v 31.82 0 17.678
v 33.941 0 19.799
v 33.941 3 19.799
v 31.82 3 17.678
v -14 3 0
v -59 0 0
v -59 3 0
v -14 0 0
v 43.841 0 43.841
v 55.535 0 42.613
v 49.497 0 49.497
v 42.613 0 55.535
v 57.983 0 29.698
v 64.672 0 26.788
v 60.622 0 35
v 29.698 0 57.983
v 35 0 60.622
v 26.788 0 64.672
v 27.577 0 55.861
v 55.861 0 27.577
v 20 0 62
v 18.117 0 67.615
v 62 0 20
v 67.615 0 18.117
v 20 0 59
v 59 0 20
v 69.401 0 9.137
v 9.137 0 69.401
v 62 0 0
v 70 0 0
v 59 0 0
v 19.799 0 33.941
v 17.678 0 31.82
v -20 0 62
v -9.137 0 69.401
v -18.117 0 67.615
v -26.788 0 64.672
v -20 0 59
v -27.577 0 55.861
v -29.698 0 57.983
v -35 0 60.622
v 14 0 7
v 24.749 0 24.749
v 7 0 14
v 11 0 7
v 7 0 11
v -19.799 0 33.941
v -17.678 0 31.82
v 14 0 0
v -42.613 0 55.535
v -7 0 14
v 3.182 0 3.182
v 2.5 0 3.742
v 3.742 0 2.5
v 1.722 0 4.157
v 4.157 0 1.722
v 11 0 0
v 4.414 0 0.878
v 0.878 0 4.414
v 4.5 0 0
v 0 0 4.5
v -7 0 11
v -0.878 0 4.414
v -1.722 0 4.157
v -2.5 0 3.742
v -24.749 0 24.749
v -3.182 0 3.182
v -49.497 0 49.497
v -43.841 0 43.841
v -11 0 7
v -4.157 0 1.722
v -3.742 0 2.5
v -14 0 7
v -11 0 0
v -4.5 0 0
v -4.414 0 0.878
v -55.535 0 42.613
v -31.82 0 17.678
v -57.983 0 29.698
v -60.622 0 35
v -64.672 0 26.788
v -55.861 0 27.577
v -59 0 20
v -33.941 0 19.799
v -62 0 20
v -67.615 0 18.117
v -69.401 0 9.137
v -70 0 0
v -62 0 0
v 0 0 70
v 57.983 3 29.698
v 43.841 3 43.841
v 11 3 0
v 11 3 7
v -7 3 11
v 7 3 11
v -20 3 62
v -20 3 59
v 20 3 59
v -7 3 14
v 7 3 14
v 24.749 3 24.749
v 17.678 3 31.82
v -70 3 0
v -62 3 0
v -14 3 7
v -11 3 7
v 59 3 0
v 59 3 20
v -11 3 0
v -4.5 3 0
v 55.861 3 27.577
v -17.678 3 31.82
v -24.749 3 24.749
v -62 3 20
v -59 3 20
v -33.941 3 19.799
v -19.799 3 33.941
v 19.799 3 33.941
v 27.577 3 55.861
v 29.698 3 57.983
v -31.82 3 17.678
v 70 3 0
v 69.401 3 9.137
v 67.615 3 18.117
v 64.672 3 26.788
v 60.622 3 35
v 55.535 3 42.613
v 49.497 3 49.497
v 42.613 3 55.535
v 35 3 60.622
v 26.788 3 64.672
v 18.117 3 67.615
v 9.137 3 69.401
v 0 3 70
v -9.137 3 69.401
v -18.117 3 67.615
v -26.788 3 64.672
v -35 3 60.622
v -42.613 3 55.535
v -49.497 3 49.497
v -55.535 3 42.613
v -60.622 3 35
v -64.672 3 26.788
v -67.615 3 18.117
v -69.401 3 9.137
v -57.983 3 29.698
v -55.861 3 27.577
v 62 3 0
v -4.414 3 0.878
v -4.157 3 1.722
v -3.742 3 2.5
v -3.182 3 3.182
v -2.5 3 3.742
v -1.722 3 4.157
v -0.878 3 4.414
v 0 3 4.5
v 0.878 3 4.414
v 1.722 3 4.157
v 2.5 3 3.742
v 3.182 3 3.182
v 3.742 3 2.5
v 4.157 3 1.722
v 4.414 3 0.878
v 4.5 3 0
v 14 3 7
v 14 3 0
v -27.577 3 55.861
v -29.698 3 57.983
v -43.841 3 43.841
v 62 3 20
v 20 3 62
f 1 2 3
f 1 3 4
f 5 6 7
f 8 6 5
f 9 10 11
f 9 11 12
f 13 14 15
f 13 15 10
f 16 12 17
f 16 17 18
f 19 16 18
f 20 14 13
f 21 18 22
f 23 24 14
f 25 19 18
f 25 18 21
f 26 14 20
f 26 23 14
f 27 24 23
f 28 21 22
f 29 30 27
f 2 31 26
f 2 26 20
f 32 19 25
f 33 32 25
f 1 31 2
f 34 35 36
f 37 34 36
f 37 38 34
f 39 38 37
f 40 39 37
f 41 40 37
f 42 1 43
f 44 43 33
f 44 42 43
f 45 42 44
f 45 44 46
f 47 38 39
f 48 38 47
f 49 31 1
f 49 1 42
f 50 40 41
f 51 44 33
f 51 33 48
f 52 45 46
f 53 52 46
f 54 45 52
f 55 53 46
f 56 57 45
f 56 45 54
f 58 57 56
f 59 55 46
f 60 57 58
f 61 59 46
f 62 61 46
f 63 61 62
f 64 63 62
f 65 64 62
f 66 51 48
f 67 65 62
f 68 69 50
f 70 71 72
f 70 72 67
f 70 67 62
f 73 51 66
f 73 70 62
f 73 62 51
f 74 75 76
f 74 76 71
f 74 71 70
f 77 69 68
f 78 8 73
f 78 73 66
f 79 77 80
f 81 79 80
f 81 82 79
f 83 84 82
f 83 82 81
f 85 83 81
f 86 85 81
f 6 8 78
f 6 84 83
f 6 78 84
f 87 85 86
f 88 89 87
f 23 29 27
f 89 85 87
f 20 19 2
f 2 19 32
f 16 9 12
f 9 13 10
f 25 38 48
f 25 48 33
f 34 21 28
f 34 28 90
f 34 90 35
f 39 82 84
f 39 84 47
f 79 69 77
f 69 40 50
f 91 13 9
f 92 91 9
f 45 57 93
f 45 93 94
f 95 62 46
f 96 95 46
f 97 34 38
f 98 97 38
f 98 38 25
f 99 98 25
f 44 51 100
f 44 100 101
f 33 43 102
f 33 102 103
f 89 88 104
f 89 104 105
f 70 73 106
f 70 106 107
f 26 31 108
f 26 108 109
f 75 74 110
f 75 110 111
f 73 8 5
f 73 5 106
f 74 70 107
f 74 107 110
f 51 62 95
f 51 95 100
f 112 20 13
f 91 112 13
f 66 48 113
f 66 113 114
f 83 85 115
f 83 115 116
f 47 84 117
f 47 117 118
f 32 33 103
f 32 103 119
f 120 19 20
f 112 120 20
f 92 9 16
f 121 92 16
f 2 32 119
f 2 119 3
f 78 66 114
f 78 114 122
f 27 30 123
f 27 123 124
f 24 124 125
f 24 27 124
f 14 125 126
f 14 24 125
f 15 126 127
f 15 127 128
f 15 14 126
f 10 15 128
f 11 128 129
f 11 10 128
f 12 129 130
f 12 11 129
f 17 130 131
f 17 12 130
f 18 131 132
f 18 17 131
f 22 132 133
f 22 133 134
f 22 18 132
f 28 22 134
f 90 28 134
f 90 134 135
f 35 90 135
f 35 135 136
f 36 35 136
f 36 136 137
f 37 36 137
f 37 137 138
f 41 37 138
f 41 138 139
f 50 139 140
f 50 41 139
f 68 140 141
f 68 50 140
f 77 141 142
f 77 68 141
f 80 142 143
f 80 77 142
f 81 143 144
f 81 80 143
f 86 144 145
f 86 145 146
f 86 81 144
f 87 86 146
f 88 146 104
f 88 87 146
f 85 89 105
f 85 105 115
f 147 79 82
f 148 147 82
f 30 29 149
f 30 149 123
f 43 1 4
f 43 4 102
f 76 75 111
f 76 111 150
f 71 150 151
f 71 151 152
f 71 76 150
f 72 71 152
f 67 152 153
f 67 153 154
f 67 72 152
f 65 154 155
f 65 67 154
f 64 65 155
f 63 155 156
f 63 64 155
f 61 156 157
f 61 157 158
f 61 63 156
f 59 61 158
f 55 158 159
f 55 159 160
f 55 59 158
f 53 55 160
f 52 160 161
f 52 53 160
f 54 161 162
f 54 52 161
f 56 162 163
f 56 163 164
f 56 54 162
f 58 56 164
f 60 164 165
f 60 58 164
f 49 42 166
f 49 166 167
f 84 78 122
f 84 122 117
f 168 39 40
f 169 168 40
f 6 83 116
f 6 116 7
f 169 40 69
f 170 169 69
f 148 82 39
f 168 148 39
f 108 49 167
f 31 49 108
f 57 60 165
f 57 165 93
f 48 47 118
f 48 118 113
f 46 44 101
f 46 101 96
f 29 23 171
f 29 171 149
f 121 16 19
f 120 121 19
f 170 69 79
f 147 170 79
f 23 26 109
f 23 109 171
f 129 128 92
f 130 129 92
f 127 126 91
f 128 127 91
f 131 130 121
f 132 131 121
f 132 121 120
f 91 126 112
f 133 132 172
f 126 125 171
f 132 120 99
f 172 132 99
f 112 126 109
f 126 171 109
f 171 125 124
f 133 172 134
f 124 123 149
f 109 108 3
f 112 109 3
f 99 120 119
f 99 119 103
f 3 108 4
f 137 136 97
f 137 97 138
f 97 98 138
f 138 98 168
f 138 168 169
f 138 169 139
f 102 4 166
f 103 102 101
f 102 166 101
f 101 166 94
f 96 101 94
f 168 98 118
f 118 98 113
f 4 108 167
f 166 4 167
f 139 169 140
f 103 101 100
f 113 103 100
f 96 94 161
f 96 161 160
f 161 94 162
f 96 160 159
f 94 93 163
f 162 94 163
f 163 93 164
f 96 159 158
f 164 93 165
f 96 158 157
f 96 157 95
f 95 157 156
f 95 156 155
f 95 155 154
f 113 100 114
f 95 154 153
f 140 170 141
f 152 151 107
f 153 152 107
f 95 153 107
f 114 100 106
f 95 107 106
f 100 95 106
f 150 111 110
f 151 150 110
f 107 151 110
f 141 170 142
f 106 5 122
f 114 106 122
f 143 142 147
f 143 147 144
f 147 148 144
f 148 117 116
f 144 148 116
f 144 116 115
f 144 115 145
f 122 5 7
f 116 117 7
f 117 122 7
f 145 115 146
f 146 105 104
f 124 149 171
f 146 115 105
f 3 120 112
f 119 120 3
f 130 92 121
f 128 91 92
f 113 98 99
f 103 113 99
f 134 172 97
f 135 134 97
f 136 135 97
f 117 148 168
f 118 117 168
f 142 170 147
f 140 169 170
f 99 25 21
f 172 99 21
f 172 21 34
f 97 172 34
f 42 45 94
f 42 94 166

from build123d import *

# Parameters (mm, degrees)
SALIENTE_EXTRUIR1_DEPTH = 3


with BuildPart() as part:
    # Croquis1 → Saliente-Extruir1 (new body)
    with BuildSketch(Plane(origin=(0, 0, 0), x_dir=(1, 0, 0), z_dir=(0, 1, 0))):
        with BuildLine():
            Line((-59, 0), (-17, 0))
            Line((-17, 0), (-14, 0))
            Line((-14, 0), (-14, -7))
            Line((-14, -7), (-11, -7))
            Line((-11, -7), (-11, 0))
            Line((-11, 0), (-4.5, 0))
            ThreePointArc((-4.5, 0), (0, -4.5), (4.5, 0))
            Line((4.5, 0), (11, 0))
            Line((11, 0), (11, -7))
            Line((11, -7), (14, -7))
            Line((14, -7), (14, 0))
            Line((14, 0), (17, 0))
            Line((17, 0), (59, 0))
            Line((59, 0), (59, -20))
            Line((59, -20), (62, -20))
            Line((62, -20), (62, 0))
            Line((62, 0), (70, 0))
            ThreePointArc((70, 0), (0, -70), (-70, 0))
            Line((-70, 0), (-62, 0))
            Line((-62, 0), (-62, -20))
            Line((-62, -20), (-59, -20))
            Line((-59, -20), (-59, 0))
        make_face()
        Polygon((-7, -14), (7, -14), (7, -11), (0, -11), (-7, -11), align=None, mode=Mode.SUBTRACT)
        Polygon((24.748737342, -24.748737342), (17.67766953, -31.819805153), (19.798989873, -33.941125497), (33.941125497, -19.798989873), (31.819805153, -17.67766953), align=None, mode=Mode.SUBTRACT)
        Polygon((-24.748737342, -24.748737342), (-31.819805153, -17.67766953), (-33.941125497, -19.798989873), (-19.798989873, -33.941125497), (-17.67766953, -31.819805153), align=None, mode=Mode.SUBTRACT)
        Polygon((27.577164466, -55.861435714), (55.861435714, -27.577164466), (57.982756057, -29.69848481), (43.840620434, -43.840620434), (29.69848481, -57.982756057), align=None, mode=Mode.SUBTRACT)
        Polygon((-20, -59), (20, -59), (20, -62), (0, -62), (-20, -62), align=None, mode=Mode.SUBTRACT)
        Polygon((-55.861435714, -27.577164466), (-27.577164466, -55.861435714), (-29.69848481, -57.982756057), (-43.840620434, -43.840620434), (-57.982756057, -29.69848481), align=None, mode=Mode.SUBTRACT)
    extrude(amount=SALIENTE_EXTRUIR1_DEPTH)


solid = part.part
